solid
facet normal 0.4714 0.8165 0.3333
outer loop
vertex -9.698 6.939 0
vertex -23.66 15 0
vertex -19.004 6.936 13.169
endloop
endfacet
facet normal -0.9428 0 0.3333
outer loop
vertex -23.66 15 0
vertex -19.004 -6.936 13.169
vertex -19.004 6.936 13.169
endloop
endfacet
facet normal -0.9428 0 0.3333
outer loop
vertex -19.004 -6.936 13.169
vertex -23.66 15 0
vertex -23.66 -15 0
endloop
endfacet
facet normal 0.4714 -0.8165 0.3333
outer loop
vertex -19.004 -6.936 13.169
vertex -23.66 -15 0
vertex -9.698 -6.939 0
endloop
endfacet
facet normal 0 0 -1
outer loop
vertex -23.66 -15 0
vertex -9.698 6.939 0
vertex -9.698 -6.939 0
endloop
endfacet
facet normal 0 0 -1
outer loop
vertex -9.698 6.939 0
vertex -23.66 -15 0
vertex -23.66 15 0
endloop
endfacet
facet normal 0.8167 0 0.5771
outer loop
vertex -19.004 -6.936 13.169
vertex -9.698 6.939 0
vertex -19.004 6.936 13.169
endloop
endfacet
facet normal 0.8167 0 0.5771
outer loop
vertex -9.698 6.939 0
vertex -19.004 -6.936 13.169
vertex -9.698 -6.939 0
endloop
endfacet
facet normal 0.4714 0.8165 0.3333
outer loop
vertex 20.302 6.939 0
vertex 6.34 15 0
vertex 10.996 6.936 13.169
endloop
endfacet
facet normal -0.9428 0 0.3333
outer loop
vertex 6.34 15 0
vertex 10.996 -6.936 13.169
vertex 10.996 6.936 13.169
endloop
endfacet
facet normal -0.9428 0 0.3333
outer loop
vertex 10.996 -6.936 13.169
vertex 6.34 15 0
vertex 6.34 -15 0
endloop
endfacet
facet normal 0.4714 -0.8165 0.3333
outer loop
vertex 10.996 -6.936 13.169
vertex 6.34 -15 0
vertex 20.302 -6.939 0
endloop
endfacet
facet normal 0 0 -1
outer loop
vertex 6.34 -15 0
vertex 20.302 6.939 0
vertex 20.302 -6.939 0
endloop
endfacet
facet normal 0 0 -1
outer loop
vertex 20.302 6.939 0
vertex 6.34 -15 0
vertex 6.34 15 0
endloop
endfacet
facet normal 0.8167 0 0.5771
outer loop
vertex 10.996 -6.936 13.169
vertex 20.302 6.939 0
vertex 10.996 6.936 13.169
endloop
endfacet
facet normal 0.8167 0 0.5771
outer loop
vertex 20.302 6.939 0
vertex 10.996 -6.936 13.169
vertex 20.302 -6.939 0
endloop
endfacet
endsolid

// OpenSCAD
l=30;
rb=l/sqrt(3);
ht=l*sqrt(2/3);
a=35.25;
htr=sqrt((l*l)*3/4);

translate([-l/2,0,0])
difference() {
cylinder(h=ht, r1=rb, r2=0, $fn=3);

rotate(-a, [0, 1, 0]) 
translate([rb-(htr/2),-l/2,-ht/2]) 
cube([l/2,l,l*1.3]);
}

translate([l/2,0,0])
difference() {
cylinder(h=ht, r1=rb, r2=0, $fn=3);

rotate(-a, [0, 1, 0]) 
translate([rb-(htr/2),-l/2,-ht/2]) 
cube([l/2,l,l*1.3]);
}
